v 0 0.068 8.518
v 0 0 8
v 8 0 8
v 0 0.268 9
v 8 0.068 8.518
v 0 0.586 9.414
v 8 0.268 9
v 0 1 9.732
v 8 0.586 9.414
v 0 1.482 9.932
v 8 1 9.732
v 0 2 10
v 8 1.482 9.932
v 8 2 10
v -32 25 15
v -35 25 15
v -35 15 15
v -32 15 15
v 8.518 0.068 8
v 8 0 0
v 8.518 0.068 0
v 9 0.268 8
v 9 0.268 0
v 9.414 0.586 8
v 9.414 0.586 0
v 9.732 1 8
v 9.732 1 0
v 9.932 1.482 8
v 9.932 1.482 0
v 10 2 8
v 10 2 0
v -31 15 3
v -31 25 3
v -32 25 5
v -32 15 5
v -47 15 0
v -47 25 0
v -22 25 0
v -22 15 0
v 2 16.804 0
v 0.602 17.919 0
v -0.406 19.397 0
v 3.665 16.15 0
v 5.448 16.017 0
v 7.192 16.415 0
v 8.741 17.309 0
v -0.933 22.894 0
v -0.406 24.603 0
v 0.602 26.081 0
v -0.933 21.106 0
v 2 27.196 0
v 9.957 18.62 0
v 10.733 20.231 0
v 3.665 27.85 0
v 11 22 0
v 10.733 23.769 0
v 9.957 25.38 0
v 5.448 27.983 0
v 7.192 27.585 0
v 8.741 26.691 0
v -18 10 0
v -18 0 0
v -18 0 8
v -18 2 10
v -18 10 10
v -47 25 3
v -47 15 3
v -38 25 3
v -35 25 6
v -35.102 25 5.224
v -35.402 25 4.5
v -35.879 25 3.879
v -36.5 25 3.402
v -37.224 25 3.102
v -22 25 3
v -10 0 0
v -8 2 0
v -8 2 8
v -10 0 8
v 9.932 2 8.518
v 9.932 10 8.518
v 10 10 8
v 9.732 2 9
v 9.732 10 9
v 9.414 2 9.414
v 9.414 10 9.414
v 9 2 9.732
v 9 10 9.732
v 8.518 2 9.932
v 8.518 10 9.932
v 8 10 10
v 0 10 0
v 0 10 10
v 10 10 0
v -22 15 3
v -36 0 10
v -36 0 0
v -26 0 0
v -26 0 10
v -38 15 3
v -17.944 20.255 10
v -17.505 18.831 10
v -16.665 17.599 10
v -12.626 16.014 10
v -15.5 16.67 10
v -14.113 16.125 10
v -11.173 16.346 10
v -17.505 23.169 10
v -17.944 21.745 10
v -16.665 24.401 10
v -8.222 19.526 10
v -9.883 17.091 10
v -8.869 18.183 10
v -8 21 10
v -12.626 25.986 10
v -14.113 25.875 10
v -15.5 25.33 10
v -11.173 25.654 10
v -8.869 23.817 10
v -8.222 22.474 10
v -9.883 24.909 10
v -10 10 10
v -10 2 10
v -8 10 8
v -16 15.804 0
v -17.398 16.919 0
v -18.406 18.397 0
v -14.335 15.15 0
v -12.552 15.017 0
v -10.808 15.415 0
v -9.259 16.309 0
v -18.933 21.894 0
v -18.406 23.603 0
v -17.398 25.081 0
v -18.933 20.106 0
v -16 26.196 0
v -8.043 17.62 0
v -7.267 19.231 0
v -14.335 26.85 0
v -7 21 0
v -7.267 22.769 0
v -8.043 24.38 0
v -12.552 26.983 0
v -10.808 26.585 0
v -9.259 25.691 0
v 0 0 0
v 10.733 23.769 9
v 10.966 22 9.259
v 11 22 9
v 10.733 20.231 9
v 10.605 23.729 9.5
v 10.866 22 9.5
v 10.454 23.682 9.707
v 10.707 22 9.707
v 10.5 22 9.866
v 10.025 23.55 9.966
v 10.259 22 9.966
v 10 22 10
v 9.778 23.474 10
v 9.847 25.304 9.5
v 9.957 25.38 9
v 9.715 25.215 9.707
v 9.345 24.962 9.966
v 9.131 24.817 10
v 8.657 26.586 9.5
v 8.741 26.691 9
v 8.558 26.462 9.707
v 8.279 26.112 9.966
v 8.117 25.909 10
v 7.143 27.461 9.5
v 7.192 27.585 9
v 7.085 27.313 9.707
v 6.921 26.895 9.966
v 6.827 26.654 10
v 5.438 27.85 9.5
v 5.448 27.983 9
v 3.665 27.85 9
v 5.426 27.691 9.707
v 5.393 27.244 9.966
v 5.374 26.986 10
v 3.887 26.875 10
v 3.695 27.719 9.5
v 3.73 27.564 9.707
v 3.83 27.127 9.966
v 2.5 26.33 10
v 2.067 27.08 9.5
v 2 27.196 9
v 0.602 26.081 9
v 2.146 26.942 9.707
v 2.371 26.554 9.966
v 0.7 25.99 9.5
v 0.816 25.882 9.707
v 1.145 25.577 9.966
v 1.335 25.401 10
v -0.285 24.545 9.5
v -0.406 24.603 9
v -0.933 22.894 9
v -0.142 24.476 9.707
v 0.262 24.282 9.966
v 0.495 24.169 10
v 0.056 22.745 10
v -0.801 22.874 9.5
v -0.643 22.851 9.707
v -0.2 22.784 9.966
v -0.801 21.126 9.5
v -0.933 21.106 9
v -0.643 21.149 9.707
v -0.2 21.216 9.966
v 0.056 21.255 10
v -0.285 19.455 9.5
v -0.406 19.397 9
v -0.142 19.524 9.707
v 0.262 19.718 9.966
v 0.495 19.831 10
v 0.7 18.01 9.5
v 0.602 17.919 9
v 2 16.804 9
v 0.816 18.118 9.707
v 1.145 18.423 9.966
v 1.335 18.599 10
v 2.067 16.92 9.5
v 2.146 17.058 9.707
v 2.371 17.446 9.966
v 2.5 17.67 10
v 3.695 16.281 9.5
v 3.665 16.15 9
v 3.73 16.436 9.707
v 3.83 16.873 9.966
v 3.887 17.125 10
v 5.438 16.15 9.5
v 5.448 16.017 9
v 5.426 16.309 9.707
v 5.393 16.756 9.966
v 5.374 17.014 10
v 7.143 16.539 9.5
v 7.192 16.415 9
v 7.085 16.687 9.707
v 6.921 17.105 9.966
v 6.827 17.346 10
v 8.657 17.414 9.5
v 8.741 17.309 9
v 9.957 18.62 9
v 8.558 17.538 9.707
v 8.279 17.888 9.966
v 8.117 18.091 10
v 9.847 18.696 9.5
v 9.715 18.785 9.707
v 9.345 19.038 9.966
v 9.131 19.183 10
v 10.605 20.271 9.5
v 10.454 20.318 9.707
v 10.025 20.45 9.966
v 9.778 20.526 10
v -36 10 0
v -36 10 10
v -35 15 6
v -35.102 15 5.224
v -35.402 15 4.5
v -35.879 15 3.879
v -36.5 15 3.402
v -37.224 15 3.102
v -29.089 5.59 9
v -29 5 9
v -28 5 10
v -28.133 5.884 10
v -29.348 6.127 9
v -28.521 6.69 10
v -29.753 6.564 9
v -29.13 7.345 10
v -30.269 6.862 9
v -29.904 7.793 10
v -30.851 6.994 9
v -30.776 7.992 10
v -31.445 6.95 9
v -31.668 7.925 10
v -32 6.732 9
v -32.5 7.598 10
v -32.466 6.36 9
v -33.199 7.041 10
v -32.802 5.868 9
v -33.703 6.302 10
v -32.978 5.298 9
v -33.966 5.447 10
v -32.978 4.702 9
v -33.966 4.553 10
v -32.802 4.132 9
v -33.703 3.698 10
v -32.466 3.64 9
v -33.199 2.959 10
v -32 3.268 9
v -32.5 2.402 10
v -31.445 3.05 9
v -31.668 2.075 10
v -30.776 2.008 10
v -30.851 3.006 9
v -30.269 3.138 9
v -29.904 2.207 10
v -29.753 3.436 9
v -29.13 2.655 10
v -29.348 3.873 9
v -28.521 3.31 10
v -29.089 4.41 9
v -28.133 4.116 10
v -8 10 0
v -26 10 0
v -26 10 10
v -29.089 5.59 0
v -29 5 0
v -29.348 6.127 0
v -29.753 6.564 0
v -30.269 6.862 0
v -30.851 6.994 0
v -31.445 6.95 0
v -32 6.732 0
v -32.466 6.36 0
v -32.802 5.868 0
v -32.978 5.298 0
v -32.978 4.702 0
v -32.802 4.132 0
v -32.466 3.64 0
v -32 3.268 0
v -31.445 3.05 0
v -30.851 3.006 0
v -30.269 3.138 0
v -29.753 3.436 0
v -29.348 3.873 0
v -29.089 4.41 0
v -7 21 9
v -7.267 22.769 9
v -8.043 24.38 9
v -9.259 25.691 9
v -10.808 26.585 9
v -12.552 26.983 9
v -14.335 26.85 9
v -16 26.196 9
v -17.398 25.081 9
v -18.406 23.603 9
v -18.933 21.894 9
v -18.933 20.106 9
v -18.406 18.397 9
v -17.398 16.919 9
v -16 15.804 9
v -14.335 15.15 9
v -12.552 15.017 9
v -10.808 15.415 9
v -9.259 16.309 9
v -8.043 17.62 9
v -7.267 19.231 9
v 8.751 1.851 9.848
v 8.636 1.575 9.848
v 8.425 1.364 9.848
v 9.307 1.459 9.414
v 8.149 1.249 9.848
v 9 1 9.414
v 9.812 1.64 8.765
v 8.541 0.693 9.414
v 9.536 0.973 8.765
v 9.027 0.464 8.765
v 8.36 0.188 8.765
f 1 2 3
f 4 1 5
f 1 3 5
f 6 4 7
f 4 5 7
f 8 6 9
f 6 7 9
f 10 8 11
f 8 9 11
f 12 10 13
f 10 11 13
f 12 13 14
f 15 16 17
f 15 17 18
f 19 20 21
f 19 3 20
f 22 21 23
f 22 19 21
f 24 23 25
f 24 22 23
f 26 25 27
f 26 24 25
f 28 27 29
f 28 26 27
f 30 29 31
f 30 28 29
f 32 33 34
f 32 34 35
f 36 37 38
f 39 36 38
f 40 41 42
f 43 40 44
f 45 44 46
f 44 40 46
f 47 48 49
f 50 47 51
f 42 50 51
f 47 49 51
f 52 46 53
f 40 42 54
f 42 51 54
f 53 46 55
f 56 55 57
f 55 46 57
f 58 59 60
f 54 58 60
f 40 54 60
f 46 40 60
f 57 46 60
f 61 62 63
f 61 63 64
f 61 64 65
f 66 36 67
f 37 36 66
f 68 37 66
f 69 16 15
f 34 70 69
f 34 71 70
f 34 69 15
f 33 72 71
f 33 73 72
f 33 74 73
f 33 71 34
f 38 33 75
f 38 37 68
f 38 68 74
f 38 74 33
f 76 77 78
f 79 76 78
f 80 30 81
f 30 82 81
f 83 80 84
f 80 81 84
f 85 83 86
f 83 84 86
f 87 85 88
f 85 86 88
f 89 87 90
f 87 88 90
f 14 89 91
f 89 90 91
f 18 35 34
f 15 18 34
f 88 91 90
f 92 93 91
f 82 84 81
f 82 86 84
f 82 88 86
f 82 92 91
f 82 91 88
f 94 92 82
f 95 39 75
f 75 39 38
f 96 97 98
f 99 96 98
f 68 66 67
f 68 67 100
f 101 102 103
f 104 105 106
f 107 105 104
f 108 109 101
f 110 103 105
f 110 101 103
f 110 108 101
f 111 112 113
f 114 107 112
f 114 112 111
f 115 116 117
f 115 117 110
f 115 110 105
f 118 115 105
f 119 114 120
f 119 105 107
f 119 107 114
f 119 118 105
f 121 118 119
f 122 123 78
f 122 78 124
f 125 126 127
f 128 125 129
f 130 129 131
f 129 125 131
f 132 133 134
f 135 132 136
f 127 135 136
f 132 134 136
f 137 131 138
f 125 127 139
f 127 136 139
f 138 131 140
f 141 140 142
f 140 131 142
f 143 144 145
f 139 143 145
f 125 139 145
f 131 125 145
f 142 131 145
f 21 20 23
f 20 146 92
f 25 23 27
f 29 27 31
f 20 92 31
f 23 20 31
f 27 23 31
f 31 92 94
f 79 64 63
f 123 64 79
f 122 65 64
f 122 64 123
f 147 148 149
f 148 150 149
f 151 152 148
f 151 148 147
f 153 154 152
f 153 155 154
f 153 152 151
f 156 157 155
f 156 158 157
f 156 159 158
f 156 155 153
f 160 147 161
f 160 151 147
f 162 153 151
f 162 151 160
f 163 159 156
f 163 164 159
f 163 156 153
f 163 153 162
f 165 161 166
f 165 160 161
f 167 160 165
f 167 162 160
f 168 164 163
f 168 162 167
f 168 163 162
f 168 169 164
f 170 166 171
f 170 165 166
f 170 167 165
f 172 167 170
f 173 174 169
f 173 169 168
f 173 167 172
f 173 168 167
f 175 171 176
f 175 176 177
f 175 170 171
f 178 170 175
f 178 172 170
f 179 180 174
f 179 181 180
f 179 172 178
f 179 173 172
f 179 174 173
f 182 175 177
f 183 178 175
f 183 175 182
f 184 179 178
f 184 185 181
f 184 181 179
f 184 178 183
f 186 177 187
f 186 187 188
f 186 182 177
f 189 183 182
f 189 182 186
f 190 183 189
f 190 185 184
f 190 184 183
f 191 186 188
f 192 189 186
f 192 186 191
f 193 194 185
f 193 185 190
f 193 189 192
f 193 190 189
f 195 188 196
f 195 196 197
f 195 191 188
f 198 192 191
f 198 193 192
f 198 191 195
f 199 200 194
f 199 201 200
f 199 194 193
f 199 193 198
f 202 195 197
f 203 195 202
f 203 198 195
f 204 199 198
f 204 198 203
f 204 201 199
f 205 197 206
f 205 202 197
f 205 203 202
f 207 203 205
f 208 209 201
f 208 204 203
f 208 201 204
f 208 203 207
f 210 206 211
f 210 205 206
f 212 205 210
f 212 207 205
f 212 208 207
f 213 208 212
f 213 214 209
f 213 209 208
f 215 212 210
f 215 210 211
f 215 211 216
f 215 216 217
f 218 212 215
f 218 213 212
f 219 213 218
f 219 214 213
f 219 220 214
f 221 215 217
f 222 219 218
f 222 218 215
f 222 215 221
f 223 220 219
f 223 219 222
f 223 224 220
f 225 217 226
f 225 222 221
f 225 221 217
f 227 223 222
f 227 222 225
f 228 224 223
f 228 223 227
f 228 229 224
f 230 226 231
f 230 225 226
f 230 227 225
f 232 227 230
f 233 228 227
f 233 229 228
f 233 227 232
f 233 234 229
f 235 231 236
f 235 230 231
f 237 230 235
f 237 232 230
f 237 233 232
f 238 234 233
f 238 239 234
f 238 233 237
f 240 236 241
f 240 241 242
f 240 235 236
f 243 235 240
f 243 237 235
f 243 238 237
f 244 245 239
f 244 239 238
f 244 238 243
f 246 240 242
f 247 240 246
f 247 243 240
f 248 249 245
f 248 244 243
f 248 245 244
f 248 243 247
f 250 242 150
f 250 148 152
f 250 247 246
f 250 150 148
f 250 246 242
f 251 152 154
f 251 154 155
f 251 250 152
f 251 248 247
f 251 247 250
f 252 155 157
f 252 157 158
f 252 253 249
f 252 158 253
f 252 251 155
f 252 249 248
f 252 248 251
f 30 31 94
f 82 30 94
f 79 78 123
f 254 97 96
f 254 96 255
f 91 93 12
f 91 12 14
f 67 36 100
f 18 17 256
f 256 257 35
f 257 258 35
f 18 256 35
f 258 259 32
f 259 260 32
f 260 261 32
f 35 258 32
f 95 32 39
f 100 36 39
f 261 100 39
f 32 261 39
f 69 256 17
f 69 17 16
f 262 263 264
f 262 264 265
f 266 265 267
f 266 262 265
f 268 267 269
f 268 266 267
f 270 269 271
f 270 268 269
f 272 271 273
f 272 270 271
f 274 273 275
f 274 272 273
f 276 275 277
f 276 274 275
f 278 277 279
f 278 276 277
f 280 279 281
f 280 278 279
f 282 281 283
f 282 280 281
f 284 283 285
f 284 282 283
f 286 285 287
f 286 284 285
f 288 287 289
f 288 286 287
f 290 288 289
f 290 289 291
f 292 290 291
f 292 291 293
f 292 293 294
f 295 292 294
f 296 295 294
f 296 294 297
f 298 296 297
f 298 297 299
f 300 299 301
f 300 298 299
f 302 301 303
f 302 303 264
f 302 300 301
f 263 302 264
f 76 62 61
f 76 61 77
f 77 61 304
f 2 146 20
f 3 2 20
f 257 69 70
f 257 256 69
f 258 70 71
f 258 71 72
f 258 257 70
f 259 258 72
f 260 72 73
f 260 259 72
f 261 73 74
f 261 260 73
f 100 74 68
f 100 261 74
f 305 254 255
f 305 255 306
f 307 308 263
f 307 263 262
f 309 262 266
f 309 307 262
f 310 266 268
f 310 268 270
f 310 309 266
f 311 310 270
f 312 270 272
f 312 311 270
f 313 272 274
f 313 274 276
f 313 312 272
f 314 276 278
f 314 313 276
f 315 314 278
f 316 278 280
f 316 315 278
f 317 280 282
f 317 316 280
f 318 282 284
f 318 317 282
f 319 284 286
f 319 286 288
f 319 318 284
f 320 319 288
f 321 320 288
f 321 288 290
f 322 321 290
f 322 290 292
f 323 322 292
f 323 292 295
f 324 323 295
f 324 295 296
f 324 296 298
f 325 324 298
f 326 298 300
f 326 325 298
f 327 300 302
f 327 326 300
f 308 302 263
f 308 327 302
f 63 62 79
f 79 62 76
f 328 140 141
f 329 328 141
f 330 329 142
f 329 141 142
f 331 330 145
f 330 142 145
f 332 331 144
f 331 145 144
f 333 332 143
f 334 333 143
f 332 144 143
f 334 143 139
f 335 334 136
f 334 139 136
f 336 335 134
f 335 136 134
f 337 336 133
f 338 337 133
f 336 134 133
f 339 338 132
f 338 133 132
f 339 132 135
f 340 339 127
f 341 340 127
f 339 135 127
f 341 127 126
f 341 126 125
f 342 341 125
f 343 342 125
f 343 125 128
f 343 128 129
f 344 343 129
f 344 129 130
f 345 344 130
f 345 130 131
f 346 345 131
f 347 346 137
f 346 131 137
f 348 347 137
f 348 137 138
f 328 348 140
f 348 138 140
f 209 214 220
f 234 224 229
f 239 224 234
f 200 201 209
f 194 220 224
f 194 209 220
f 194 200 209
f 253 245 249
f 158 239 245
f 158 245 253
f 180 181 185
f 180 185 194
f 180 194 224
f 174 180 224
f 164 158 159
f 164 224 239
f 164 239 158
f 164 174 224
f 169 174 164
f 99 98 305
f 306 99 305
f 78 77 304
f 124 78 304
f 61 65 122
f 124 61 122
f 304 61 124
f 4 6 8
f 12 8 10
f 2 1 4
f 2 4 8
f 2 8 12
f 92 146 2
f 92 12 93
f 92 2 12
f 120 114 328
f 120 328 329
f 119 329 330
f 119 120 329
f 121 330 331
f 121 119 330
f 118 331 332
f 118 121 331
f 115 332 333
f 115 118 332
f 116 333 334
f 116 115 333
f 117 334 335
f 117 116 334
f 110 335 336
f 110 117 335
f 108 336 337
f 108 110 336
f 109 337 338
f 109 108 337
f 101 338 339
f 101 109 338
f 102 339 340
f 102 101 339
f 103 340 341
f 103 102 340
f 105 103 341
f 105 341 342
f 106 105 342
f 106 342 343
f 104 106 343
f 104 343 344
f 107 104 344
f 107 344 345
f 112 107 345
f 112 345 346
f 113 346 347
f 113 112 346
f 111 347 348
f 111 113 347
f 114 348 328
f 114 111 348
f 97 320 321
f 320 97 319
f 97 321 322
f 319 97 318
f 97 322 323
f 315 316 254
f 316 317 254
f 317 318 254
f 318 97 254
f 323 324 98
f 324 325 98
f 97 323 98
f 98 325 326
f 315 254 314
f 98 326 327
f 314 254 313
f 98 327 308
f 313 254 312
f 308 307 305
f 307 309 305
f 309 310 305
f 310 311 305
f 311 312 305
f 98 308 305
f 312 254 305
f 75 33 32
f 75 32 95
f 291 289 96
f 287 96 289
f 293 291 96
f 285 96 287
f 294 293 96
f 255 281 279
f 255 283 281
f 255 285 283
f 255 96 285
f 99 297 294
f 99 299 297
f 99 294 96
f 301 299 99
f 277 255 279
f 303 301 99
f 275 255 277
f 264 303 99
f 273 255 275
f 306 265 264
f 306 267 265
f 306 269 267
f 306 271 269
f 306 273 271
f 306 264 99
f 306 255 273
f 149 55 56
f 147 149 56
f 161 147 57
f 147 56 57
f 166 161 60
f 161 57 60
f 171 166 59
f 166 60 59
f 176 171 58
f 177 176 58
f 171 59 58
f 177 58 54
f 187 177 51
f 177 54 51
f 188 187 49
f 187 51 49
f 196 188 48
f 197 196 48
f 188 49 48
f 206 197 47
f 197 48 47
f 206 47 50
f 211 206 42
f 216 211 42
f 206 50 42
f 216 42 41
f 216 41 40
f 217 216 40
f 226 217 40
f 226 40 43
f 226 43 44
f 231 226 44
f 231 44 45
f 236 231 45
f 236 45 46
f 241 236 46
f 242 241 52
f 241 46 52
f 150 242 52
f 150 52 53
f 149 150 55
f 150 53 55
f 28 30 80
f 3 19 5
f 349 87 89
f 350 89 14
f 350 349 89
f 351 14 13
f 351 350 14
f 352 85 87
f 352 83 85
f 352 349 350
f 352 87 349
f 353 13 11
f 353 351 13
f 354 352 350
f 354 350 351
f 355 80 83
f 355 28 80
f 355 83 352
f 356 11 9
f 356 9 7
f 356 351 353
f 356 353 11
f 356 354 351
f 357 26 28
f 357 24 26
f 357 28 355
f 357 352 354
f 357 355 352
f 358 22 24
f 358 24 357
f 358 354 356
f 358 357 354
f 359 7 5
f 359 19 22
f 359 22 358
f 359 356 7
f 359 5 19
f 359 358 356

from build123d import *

# Parameters (mm, degrees)
BOX_W             = 10
BOX_H             = 10
BOX_DEPTH         = 10
FILLET_R          = 2
BOX001_W          = 10
BOX001_H          = 10
BOX001_DEPTH      = 10
CHAMFER_SIZE      = 2
CYLINDER_R        = 2
CYLINDER_DEPTH    = 10
BOX002_W          = 10
BOX002_H          = 10
BOX002_DEPTH      = 10
CHAMFER001_SIZE   = 1
CYLINDER001_R     = 6
CYLINDER001_DEPTH = 10
FILLET001_R       = 1
CYLINDER002_R     = 6
CYLINDER002_DEPTH = 10
CHAMFER002_SIZE   = 1
BOX004_W          = 3
BOX004_H          = 10
BOX004_DEPTH      = 15
BOX003_W          = 25
BOX003_H          = 10
BOX003_DEPTH      = 3
CHAMFER003_SIZE2  = 1
CHAMFER003_SIZE   = 2
FILLET002_R       = 3


with BuildPart() as fillet_body:
    # Box → Box (new body)
    with BuildSketch(Plane.XY):
        with Locations((5, 5)):
            Rectangle(BOX_W, BOX_H)
    extrude(amount=BOX_DEPTH)

    # Fillet
    fillet_edges = [fillet_body.edges().sort_by_distance(p)[0] for p in [
        (10, 0, 5),
        (10, 5, 10),
        (5, 0, 10),
    ]]
    fillet(fillet_edges, radius=FILLET_R)


with BuildPart() as chamfer_body:
    # Box001 → Box001 (new body)
    with BuildSketch(Plane(origin=(-18, 0, 0), x_dir=(1, 0, 0), z_dir=(0, 0, 1))):
        with Locations((5, 5)):
            Rectangle(BOX001_W, BOX001_H)
    extrude(amount=BOX001_DEPTH)

    # Chamfer
    chamfer_edges = [chamfer_body.edges().sort_by_distance(p)[0] for p in [
        (-8, 0, 5),
        (-8, 5, 10),
        (-13, 0, 10),
    ]]
    chamfer(chamfer_edges, length=CHAMFER_SIZE)


with BuildPart() as cilindre:
    # Cylinder → Cylinder (new body)
    with BuildSketch(Plane(origin=(-31, 5, 0), x_dir=(1, 0, 0), z_dir=(0, 0, 1))):
        Circle(CYLINDER_R)
    extrude(amount=CYLINDER_DEPTH)


with BuildPart() as chamfer001:
    # Box002 → Box002 (new body)
    with BuildSketch(Plane(origin=(-36, 0, 0), x_dir=(1, 0, 0), z_dir=(0, 0, 1))):
        with Locations((5, 5)):
            Rectangle(BOX002_W, BOX002_H)
    extrude(amount=BOX002_DEPTH)

    # Cut: cut Cilindre
    add(cilindre.part, mode=Mode.SUBTRACT)

    # Chamfer001
    chamfer001_edges = [chamfer001.edges().sort_by_distance(p)[0] for p in [
        (-33, 5, 10),
    ]]
    chamfer(chamfer001_edges, length=CHAMFER001_SIZE)


with BuildPart() as fillet001:
    # Cylinder001 → Cylinder001 (new body)
    with BuildSketch(Plane(origin=(5, 22, 0), x_dir=(1, 0, 0), z_dir=(0, 0, 1))):
        Circle(CYLINDER001_R)
    extrude(amount=CYLINDER001_DEPTH)

    # Fillet001
    fillet001_edges = [fillet001.edges().sort_by_distance(p)[0] for p in [
        (-1, 22, 10),
    ]]
    fillet(fillet001_edges, radius=FILLET001_R)


with BuildPart() as chamfer002:
    # Cylinder002 → Cylinder002 (new body)
    with BuildSketch(Plane(origin=(-13, 21, 0), x_dir=(1, 0, 0), z_dir=(0, 0, 1))):
        Circle(CYLINDER002_R)
    extrude(amount=CYLINDER002_DEPTH)

    # Chamfer002
    chamfer002_edges = [chamfer002.edges().sort_by_distance(p)[0] for p in [
        (-19, 21, 10),
    ]]
    chamfer(chamfer002_edges, length=CHAMFER002_SIZE)


with BuildPart() as cub004:
    # Box004 → Box004 (new body)
    with BuildSketch(Plane(origin=(-35, 15, 0), x_dir=(1, 0, 0), z_dir=(0, 0, 1))):
        with Locations((1.5, 5)):
            Rectangle(BOX004_W, BOX004_H)
    extrude(amount=BOX004_DEPTH)


with BuildPart() as fillet002:
    # Box003 → Box003 (new body)
    with BuildSketch(Plane(origin=(-47, 15, 0), x_dir=(1, 0, 0), z_dir=(0, 0, 1))):
        with Locations((12.5, 5)):
            Rectangle(BOX003_W, BOX003_H)
    extrude(amount=BOX003_DEPTH)

    # Fusion: union Cub004
    add(cub004.part)

    # Chamfer003
    chamfer003_edges = [fillet002.edges().sort_by_distance(p)[0] for p in [
        (-32, 20, 3),
    ]]
    chamfer003_side = fillet002.faces().sort_by_distance((-32, 20, 9))[0]
    chamfer(chamfer003_edges, length=CHAMFER003_SIZE, length2=CHAMFER003_SIZE2, reference=chamfer003_side)

    # Fillet002
    fillet002_edges = [fillet002.edges().sort_by_distance(p)[0] for p in [
        (-35, 20, 3),
    ]]
    fillet(fillet002_edges, radius=FILLET002_R)


solid = Compound([fillet_body.part, chamfer_body.part, chamfer001.part, fillet001.part, chamfer002.part, fillet002.part])
